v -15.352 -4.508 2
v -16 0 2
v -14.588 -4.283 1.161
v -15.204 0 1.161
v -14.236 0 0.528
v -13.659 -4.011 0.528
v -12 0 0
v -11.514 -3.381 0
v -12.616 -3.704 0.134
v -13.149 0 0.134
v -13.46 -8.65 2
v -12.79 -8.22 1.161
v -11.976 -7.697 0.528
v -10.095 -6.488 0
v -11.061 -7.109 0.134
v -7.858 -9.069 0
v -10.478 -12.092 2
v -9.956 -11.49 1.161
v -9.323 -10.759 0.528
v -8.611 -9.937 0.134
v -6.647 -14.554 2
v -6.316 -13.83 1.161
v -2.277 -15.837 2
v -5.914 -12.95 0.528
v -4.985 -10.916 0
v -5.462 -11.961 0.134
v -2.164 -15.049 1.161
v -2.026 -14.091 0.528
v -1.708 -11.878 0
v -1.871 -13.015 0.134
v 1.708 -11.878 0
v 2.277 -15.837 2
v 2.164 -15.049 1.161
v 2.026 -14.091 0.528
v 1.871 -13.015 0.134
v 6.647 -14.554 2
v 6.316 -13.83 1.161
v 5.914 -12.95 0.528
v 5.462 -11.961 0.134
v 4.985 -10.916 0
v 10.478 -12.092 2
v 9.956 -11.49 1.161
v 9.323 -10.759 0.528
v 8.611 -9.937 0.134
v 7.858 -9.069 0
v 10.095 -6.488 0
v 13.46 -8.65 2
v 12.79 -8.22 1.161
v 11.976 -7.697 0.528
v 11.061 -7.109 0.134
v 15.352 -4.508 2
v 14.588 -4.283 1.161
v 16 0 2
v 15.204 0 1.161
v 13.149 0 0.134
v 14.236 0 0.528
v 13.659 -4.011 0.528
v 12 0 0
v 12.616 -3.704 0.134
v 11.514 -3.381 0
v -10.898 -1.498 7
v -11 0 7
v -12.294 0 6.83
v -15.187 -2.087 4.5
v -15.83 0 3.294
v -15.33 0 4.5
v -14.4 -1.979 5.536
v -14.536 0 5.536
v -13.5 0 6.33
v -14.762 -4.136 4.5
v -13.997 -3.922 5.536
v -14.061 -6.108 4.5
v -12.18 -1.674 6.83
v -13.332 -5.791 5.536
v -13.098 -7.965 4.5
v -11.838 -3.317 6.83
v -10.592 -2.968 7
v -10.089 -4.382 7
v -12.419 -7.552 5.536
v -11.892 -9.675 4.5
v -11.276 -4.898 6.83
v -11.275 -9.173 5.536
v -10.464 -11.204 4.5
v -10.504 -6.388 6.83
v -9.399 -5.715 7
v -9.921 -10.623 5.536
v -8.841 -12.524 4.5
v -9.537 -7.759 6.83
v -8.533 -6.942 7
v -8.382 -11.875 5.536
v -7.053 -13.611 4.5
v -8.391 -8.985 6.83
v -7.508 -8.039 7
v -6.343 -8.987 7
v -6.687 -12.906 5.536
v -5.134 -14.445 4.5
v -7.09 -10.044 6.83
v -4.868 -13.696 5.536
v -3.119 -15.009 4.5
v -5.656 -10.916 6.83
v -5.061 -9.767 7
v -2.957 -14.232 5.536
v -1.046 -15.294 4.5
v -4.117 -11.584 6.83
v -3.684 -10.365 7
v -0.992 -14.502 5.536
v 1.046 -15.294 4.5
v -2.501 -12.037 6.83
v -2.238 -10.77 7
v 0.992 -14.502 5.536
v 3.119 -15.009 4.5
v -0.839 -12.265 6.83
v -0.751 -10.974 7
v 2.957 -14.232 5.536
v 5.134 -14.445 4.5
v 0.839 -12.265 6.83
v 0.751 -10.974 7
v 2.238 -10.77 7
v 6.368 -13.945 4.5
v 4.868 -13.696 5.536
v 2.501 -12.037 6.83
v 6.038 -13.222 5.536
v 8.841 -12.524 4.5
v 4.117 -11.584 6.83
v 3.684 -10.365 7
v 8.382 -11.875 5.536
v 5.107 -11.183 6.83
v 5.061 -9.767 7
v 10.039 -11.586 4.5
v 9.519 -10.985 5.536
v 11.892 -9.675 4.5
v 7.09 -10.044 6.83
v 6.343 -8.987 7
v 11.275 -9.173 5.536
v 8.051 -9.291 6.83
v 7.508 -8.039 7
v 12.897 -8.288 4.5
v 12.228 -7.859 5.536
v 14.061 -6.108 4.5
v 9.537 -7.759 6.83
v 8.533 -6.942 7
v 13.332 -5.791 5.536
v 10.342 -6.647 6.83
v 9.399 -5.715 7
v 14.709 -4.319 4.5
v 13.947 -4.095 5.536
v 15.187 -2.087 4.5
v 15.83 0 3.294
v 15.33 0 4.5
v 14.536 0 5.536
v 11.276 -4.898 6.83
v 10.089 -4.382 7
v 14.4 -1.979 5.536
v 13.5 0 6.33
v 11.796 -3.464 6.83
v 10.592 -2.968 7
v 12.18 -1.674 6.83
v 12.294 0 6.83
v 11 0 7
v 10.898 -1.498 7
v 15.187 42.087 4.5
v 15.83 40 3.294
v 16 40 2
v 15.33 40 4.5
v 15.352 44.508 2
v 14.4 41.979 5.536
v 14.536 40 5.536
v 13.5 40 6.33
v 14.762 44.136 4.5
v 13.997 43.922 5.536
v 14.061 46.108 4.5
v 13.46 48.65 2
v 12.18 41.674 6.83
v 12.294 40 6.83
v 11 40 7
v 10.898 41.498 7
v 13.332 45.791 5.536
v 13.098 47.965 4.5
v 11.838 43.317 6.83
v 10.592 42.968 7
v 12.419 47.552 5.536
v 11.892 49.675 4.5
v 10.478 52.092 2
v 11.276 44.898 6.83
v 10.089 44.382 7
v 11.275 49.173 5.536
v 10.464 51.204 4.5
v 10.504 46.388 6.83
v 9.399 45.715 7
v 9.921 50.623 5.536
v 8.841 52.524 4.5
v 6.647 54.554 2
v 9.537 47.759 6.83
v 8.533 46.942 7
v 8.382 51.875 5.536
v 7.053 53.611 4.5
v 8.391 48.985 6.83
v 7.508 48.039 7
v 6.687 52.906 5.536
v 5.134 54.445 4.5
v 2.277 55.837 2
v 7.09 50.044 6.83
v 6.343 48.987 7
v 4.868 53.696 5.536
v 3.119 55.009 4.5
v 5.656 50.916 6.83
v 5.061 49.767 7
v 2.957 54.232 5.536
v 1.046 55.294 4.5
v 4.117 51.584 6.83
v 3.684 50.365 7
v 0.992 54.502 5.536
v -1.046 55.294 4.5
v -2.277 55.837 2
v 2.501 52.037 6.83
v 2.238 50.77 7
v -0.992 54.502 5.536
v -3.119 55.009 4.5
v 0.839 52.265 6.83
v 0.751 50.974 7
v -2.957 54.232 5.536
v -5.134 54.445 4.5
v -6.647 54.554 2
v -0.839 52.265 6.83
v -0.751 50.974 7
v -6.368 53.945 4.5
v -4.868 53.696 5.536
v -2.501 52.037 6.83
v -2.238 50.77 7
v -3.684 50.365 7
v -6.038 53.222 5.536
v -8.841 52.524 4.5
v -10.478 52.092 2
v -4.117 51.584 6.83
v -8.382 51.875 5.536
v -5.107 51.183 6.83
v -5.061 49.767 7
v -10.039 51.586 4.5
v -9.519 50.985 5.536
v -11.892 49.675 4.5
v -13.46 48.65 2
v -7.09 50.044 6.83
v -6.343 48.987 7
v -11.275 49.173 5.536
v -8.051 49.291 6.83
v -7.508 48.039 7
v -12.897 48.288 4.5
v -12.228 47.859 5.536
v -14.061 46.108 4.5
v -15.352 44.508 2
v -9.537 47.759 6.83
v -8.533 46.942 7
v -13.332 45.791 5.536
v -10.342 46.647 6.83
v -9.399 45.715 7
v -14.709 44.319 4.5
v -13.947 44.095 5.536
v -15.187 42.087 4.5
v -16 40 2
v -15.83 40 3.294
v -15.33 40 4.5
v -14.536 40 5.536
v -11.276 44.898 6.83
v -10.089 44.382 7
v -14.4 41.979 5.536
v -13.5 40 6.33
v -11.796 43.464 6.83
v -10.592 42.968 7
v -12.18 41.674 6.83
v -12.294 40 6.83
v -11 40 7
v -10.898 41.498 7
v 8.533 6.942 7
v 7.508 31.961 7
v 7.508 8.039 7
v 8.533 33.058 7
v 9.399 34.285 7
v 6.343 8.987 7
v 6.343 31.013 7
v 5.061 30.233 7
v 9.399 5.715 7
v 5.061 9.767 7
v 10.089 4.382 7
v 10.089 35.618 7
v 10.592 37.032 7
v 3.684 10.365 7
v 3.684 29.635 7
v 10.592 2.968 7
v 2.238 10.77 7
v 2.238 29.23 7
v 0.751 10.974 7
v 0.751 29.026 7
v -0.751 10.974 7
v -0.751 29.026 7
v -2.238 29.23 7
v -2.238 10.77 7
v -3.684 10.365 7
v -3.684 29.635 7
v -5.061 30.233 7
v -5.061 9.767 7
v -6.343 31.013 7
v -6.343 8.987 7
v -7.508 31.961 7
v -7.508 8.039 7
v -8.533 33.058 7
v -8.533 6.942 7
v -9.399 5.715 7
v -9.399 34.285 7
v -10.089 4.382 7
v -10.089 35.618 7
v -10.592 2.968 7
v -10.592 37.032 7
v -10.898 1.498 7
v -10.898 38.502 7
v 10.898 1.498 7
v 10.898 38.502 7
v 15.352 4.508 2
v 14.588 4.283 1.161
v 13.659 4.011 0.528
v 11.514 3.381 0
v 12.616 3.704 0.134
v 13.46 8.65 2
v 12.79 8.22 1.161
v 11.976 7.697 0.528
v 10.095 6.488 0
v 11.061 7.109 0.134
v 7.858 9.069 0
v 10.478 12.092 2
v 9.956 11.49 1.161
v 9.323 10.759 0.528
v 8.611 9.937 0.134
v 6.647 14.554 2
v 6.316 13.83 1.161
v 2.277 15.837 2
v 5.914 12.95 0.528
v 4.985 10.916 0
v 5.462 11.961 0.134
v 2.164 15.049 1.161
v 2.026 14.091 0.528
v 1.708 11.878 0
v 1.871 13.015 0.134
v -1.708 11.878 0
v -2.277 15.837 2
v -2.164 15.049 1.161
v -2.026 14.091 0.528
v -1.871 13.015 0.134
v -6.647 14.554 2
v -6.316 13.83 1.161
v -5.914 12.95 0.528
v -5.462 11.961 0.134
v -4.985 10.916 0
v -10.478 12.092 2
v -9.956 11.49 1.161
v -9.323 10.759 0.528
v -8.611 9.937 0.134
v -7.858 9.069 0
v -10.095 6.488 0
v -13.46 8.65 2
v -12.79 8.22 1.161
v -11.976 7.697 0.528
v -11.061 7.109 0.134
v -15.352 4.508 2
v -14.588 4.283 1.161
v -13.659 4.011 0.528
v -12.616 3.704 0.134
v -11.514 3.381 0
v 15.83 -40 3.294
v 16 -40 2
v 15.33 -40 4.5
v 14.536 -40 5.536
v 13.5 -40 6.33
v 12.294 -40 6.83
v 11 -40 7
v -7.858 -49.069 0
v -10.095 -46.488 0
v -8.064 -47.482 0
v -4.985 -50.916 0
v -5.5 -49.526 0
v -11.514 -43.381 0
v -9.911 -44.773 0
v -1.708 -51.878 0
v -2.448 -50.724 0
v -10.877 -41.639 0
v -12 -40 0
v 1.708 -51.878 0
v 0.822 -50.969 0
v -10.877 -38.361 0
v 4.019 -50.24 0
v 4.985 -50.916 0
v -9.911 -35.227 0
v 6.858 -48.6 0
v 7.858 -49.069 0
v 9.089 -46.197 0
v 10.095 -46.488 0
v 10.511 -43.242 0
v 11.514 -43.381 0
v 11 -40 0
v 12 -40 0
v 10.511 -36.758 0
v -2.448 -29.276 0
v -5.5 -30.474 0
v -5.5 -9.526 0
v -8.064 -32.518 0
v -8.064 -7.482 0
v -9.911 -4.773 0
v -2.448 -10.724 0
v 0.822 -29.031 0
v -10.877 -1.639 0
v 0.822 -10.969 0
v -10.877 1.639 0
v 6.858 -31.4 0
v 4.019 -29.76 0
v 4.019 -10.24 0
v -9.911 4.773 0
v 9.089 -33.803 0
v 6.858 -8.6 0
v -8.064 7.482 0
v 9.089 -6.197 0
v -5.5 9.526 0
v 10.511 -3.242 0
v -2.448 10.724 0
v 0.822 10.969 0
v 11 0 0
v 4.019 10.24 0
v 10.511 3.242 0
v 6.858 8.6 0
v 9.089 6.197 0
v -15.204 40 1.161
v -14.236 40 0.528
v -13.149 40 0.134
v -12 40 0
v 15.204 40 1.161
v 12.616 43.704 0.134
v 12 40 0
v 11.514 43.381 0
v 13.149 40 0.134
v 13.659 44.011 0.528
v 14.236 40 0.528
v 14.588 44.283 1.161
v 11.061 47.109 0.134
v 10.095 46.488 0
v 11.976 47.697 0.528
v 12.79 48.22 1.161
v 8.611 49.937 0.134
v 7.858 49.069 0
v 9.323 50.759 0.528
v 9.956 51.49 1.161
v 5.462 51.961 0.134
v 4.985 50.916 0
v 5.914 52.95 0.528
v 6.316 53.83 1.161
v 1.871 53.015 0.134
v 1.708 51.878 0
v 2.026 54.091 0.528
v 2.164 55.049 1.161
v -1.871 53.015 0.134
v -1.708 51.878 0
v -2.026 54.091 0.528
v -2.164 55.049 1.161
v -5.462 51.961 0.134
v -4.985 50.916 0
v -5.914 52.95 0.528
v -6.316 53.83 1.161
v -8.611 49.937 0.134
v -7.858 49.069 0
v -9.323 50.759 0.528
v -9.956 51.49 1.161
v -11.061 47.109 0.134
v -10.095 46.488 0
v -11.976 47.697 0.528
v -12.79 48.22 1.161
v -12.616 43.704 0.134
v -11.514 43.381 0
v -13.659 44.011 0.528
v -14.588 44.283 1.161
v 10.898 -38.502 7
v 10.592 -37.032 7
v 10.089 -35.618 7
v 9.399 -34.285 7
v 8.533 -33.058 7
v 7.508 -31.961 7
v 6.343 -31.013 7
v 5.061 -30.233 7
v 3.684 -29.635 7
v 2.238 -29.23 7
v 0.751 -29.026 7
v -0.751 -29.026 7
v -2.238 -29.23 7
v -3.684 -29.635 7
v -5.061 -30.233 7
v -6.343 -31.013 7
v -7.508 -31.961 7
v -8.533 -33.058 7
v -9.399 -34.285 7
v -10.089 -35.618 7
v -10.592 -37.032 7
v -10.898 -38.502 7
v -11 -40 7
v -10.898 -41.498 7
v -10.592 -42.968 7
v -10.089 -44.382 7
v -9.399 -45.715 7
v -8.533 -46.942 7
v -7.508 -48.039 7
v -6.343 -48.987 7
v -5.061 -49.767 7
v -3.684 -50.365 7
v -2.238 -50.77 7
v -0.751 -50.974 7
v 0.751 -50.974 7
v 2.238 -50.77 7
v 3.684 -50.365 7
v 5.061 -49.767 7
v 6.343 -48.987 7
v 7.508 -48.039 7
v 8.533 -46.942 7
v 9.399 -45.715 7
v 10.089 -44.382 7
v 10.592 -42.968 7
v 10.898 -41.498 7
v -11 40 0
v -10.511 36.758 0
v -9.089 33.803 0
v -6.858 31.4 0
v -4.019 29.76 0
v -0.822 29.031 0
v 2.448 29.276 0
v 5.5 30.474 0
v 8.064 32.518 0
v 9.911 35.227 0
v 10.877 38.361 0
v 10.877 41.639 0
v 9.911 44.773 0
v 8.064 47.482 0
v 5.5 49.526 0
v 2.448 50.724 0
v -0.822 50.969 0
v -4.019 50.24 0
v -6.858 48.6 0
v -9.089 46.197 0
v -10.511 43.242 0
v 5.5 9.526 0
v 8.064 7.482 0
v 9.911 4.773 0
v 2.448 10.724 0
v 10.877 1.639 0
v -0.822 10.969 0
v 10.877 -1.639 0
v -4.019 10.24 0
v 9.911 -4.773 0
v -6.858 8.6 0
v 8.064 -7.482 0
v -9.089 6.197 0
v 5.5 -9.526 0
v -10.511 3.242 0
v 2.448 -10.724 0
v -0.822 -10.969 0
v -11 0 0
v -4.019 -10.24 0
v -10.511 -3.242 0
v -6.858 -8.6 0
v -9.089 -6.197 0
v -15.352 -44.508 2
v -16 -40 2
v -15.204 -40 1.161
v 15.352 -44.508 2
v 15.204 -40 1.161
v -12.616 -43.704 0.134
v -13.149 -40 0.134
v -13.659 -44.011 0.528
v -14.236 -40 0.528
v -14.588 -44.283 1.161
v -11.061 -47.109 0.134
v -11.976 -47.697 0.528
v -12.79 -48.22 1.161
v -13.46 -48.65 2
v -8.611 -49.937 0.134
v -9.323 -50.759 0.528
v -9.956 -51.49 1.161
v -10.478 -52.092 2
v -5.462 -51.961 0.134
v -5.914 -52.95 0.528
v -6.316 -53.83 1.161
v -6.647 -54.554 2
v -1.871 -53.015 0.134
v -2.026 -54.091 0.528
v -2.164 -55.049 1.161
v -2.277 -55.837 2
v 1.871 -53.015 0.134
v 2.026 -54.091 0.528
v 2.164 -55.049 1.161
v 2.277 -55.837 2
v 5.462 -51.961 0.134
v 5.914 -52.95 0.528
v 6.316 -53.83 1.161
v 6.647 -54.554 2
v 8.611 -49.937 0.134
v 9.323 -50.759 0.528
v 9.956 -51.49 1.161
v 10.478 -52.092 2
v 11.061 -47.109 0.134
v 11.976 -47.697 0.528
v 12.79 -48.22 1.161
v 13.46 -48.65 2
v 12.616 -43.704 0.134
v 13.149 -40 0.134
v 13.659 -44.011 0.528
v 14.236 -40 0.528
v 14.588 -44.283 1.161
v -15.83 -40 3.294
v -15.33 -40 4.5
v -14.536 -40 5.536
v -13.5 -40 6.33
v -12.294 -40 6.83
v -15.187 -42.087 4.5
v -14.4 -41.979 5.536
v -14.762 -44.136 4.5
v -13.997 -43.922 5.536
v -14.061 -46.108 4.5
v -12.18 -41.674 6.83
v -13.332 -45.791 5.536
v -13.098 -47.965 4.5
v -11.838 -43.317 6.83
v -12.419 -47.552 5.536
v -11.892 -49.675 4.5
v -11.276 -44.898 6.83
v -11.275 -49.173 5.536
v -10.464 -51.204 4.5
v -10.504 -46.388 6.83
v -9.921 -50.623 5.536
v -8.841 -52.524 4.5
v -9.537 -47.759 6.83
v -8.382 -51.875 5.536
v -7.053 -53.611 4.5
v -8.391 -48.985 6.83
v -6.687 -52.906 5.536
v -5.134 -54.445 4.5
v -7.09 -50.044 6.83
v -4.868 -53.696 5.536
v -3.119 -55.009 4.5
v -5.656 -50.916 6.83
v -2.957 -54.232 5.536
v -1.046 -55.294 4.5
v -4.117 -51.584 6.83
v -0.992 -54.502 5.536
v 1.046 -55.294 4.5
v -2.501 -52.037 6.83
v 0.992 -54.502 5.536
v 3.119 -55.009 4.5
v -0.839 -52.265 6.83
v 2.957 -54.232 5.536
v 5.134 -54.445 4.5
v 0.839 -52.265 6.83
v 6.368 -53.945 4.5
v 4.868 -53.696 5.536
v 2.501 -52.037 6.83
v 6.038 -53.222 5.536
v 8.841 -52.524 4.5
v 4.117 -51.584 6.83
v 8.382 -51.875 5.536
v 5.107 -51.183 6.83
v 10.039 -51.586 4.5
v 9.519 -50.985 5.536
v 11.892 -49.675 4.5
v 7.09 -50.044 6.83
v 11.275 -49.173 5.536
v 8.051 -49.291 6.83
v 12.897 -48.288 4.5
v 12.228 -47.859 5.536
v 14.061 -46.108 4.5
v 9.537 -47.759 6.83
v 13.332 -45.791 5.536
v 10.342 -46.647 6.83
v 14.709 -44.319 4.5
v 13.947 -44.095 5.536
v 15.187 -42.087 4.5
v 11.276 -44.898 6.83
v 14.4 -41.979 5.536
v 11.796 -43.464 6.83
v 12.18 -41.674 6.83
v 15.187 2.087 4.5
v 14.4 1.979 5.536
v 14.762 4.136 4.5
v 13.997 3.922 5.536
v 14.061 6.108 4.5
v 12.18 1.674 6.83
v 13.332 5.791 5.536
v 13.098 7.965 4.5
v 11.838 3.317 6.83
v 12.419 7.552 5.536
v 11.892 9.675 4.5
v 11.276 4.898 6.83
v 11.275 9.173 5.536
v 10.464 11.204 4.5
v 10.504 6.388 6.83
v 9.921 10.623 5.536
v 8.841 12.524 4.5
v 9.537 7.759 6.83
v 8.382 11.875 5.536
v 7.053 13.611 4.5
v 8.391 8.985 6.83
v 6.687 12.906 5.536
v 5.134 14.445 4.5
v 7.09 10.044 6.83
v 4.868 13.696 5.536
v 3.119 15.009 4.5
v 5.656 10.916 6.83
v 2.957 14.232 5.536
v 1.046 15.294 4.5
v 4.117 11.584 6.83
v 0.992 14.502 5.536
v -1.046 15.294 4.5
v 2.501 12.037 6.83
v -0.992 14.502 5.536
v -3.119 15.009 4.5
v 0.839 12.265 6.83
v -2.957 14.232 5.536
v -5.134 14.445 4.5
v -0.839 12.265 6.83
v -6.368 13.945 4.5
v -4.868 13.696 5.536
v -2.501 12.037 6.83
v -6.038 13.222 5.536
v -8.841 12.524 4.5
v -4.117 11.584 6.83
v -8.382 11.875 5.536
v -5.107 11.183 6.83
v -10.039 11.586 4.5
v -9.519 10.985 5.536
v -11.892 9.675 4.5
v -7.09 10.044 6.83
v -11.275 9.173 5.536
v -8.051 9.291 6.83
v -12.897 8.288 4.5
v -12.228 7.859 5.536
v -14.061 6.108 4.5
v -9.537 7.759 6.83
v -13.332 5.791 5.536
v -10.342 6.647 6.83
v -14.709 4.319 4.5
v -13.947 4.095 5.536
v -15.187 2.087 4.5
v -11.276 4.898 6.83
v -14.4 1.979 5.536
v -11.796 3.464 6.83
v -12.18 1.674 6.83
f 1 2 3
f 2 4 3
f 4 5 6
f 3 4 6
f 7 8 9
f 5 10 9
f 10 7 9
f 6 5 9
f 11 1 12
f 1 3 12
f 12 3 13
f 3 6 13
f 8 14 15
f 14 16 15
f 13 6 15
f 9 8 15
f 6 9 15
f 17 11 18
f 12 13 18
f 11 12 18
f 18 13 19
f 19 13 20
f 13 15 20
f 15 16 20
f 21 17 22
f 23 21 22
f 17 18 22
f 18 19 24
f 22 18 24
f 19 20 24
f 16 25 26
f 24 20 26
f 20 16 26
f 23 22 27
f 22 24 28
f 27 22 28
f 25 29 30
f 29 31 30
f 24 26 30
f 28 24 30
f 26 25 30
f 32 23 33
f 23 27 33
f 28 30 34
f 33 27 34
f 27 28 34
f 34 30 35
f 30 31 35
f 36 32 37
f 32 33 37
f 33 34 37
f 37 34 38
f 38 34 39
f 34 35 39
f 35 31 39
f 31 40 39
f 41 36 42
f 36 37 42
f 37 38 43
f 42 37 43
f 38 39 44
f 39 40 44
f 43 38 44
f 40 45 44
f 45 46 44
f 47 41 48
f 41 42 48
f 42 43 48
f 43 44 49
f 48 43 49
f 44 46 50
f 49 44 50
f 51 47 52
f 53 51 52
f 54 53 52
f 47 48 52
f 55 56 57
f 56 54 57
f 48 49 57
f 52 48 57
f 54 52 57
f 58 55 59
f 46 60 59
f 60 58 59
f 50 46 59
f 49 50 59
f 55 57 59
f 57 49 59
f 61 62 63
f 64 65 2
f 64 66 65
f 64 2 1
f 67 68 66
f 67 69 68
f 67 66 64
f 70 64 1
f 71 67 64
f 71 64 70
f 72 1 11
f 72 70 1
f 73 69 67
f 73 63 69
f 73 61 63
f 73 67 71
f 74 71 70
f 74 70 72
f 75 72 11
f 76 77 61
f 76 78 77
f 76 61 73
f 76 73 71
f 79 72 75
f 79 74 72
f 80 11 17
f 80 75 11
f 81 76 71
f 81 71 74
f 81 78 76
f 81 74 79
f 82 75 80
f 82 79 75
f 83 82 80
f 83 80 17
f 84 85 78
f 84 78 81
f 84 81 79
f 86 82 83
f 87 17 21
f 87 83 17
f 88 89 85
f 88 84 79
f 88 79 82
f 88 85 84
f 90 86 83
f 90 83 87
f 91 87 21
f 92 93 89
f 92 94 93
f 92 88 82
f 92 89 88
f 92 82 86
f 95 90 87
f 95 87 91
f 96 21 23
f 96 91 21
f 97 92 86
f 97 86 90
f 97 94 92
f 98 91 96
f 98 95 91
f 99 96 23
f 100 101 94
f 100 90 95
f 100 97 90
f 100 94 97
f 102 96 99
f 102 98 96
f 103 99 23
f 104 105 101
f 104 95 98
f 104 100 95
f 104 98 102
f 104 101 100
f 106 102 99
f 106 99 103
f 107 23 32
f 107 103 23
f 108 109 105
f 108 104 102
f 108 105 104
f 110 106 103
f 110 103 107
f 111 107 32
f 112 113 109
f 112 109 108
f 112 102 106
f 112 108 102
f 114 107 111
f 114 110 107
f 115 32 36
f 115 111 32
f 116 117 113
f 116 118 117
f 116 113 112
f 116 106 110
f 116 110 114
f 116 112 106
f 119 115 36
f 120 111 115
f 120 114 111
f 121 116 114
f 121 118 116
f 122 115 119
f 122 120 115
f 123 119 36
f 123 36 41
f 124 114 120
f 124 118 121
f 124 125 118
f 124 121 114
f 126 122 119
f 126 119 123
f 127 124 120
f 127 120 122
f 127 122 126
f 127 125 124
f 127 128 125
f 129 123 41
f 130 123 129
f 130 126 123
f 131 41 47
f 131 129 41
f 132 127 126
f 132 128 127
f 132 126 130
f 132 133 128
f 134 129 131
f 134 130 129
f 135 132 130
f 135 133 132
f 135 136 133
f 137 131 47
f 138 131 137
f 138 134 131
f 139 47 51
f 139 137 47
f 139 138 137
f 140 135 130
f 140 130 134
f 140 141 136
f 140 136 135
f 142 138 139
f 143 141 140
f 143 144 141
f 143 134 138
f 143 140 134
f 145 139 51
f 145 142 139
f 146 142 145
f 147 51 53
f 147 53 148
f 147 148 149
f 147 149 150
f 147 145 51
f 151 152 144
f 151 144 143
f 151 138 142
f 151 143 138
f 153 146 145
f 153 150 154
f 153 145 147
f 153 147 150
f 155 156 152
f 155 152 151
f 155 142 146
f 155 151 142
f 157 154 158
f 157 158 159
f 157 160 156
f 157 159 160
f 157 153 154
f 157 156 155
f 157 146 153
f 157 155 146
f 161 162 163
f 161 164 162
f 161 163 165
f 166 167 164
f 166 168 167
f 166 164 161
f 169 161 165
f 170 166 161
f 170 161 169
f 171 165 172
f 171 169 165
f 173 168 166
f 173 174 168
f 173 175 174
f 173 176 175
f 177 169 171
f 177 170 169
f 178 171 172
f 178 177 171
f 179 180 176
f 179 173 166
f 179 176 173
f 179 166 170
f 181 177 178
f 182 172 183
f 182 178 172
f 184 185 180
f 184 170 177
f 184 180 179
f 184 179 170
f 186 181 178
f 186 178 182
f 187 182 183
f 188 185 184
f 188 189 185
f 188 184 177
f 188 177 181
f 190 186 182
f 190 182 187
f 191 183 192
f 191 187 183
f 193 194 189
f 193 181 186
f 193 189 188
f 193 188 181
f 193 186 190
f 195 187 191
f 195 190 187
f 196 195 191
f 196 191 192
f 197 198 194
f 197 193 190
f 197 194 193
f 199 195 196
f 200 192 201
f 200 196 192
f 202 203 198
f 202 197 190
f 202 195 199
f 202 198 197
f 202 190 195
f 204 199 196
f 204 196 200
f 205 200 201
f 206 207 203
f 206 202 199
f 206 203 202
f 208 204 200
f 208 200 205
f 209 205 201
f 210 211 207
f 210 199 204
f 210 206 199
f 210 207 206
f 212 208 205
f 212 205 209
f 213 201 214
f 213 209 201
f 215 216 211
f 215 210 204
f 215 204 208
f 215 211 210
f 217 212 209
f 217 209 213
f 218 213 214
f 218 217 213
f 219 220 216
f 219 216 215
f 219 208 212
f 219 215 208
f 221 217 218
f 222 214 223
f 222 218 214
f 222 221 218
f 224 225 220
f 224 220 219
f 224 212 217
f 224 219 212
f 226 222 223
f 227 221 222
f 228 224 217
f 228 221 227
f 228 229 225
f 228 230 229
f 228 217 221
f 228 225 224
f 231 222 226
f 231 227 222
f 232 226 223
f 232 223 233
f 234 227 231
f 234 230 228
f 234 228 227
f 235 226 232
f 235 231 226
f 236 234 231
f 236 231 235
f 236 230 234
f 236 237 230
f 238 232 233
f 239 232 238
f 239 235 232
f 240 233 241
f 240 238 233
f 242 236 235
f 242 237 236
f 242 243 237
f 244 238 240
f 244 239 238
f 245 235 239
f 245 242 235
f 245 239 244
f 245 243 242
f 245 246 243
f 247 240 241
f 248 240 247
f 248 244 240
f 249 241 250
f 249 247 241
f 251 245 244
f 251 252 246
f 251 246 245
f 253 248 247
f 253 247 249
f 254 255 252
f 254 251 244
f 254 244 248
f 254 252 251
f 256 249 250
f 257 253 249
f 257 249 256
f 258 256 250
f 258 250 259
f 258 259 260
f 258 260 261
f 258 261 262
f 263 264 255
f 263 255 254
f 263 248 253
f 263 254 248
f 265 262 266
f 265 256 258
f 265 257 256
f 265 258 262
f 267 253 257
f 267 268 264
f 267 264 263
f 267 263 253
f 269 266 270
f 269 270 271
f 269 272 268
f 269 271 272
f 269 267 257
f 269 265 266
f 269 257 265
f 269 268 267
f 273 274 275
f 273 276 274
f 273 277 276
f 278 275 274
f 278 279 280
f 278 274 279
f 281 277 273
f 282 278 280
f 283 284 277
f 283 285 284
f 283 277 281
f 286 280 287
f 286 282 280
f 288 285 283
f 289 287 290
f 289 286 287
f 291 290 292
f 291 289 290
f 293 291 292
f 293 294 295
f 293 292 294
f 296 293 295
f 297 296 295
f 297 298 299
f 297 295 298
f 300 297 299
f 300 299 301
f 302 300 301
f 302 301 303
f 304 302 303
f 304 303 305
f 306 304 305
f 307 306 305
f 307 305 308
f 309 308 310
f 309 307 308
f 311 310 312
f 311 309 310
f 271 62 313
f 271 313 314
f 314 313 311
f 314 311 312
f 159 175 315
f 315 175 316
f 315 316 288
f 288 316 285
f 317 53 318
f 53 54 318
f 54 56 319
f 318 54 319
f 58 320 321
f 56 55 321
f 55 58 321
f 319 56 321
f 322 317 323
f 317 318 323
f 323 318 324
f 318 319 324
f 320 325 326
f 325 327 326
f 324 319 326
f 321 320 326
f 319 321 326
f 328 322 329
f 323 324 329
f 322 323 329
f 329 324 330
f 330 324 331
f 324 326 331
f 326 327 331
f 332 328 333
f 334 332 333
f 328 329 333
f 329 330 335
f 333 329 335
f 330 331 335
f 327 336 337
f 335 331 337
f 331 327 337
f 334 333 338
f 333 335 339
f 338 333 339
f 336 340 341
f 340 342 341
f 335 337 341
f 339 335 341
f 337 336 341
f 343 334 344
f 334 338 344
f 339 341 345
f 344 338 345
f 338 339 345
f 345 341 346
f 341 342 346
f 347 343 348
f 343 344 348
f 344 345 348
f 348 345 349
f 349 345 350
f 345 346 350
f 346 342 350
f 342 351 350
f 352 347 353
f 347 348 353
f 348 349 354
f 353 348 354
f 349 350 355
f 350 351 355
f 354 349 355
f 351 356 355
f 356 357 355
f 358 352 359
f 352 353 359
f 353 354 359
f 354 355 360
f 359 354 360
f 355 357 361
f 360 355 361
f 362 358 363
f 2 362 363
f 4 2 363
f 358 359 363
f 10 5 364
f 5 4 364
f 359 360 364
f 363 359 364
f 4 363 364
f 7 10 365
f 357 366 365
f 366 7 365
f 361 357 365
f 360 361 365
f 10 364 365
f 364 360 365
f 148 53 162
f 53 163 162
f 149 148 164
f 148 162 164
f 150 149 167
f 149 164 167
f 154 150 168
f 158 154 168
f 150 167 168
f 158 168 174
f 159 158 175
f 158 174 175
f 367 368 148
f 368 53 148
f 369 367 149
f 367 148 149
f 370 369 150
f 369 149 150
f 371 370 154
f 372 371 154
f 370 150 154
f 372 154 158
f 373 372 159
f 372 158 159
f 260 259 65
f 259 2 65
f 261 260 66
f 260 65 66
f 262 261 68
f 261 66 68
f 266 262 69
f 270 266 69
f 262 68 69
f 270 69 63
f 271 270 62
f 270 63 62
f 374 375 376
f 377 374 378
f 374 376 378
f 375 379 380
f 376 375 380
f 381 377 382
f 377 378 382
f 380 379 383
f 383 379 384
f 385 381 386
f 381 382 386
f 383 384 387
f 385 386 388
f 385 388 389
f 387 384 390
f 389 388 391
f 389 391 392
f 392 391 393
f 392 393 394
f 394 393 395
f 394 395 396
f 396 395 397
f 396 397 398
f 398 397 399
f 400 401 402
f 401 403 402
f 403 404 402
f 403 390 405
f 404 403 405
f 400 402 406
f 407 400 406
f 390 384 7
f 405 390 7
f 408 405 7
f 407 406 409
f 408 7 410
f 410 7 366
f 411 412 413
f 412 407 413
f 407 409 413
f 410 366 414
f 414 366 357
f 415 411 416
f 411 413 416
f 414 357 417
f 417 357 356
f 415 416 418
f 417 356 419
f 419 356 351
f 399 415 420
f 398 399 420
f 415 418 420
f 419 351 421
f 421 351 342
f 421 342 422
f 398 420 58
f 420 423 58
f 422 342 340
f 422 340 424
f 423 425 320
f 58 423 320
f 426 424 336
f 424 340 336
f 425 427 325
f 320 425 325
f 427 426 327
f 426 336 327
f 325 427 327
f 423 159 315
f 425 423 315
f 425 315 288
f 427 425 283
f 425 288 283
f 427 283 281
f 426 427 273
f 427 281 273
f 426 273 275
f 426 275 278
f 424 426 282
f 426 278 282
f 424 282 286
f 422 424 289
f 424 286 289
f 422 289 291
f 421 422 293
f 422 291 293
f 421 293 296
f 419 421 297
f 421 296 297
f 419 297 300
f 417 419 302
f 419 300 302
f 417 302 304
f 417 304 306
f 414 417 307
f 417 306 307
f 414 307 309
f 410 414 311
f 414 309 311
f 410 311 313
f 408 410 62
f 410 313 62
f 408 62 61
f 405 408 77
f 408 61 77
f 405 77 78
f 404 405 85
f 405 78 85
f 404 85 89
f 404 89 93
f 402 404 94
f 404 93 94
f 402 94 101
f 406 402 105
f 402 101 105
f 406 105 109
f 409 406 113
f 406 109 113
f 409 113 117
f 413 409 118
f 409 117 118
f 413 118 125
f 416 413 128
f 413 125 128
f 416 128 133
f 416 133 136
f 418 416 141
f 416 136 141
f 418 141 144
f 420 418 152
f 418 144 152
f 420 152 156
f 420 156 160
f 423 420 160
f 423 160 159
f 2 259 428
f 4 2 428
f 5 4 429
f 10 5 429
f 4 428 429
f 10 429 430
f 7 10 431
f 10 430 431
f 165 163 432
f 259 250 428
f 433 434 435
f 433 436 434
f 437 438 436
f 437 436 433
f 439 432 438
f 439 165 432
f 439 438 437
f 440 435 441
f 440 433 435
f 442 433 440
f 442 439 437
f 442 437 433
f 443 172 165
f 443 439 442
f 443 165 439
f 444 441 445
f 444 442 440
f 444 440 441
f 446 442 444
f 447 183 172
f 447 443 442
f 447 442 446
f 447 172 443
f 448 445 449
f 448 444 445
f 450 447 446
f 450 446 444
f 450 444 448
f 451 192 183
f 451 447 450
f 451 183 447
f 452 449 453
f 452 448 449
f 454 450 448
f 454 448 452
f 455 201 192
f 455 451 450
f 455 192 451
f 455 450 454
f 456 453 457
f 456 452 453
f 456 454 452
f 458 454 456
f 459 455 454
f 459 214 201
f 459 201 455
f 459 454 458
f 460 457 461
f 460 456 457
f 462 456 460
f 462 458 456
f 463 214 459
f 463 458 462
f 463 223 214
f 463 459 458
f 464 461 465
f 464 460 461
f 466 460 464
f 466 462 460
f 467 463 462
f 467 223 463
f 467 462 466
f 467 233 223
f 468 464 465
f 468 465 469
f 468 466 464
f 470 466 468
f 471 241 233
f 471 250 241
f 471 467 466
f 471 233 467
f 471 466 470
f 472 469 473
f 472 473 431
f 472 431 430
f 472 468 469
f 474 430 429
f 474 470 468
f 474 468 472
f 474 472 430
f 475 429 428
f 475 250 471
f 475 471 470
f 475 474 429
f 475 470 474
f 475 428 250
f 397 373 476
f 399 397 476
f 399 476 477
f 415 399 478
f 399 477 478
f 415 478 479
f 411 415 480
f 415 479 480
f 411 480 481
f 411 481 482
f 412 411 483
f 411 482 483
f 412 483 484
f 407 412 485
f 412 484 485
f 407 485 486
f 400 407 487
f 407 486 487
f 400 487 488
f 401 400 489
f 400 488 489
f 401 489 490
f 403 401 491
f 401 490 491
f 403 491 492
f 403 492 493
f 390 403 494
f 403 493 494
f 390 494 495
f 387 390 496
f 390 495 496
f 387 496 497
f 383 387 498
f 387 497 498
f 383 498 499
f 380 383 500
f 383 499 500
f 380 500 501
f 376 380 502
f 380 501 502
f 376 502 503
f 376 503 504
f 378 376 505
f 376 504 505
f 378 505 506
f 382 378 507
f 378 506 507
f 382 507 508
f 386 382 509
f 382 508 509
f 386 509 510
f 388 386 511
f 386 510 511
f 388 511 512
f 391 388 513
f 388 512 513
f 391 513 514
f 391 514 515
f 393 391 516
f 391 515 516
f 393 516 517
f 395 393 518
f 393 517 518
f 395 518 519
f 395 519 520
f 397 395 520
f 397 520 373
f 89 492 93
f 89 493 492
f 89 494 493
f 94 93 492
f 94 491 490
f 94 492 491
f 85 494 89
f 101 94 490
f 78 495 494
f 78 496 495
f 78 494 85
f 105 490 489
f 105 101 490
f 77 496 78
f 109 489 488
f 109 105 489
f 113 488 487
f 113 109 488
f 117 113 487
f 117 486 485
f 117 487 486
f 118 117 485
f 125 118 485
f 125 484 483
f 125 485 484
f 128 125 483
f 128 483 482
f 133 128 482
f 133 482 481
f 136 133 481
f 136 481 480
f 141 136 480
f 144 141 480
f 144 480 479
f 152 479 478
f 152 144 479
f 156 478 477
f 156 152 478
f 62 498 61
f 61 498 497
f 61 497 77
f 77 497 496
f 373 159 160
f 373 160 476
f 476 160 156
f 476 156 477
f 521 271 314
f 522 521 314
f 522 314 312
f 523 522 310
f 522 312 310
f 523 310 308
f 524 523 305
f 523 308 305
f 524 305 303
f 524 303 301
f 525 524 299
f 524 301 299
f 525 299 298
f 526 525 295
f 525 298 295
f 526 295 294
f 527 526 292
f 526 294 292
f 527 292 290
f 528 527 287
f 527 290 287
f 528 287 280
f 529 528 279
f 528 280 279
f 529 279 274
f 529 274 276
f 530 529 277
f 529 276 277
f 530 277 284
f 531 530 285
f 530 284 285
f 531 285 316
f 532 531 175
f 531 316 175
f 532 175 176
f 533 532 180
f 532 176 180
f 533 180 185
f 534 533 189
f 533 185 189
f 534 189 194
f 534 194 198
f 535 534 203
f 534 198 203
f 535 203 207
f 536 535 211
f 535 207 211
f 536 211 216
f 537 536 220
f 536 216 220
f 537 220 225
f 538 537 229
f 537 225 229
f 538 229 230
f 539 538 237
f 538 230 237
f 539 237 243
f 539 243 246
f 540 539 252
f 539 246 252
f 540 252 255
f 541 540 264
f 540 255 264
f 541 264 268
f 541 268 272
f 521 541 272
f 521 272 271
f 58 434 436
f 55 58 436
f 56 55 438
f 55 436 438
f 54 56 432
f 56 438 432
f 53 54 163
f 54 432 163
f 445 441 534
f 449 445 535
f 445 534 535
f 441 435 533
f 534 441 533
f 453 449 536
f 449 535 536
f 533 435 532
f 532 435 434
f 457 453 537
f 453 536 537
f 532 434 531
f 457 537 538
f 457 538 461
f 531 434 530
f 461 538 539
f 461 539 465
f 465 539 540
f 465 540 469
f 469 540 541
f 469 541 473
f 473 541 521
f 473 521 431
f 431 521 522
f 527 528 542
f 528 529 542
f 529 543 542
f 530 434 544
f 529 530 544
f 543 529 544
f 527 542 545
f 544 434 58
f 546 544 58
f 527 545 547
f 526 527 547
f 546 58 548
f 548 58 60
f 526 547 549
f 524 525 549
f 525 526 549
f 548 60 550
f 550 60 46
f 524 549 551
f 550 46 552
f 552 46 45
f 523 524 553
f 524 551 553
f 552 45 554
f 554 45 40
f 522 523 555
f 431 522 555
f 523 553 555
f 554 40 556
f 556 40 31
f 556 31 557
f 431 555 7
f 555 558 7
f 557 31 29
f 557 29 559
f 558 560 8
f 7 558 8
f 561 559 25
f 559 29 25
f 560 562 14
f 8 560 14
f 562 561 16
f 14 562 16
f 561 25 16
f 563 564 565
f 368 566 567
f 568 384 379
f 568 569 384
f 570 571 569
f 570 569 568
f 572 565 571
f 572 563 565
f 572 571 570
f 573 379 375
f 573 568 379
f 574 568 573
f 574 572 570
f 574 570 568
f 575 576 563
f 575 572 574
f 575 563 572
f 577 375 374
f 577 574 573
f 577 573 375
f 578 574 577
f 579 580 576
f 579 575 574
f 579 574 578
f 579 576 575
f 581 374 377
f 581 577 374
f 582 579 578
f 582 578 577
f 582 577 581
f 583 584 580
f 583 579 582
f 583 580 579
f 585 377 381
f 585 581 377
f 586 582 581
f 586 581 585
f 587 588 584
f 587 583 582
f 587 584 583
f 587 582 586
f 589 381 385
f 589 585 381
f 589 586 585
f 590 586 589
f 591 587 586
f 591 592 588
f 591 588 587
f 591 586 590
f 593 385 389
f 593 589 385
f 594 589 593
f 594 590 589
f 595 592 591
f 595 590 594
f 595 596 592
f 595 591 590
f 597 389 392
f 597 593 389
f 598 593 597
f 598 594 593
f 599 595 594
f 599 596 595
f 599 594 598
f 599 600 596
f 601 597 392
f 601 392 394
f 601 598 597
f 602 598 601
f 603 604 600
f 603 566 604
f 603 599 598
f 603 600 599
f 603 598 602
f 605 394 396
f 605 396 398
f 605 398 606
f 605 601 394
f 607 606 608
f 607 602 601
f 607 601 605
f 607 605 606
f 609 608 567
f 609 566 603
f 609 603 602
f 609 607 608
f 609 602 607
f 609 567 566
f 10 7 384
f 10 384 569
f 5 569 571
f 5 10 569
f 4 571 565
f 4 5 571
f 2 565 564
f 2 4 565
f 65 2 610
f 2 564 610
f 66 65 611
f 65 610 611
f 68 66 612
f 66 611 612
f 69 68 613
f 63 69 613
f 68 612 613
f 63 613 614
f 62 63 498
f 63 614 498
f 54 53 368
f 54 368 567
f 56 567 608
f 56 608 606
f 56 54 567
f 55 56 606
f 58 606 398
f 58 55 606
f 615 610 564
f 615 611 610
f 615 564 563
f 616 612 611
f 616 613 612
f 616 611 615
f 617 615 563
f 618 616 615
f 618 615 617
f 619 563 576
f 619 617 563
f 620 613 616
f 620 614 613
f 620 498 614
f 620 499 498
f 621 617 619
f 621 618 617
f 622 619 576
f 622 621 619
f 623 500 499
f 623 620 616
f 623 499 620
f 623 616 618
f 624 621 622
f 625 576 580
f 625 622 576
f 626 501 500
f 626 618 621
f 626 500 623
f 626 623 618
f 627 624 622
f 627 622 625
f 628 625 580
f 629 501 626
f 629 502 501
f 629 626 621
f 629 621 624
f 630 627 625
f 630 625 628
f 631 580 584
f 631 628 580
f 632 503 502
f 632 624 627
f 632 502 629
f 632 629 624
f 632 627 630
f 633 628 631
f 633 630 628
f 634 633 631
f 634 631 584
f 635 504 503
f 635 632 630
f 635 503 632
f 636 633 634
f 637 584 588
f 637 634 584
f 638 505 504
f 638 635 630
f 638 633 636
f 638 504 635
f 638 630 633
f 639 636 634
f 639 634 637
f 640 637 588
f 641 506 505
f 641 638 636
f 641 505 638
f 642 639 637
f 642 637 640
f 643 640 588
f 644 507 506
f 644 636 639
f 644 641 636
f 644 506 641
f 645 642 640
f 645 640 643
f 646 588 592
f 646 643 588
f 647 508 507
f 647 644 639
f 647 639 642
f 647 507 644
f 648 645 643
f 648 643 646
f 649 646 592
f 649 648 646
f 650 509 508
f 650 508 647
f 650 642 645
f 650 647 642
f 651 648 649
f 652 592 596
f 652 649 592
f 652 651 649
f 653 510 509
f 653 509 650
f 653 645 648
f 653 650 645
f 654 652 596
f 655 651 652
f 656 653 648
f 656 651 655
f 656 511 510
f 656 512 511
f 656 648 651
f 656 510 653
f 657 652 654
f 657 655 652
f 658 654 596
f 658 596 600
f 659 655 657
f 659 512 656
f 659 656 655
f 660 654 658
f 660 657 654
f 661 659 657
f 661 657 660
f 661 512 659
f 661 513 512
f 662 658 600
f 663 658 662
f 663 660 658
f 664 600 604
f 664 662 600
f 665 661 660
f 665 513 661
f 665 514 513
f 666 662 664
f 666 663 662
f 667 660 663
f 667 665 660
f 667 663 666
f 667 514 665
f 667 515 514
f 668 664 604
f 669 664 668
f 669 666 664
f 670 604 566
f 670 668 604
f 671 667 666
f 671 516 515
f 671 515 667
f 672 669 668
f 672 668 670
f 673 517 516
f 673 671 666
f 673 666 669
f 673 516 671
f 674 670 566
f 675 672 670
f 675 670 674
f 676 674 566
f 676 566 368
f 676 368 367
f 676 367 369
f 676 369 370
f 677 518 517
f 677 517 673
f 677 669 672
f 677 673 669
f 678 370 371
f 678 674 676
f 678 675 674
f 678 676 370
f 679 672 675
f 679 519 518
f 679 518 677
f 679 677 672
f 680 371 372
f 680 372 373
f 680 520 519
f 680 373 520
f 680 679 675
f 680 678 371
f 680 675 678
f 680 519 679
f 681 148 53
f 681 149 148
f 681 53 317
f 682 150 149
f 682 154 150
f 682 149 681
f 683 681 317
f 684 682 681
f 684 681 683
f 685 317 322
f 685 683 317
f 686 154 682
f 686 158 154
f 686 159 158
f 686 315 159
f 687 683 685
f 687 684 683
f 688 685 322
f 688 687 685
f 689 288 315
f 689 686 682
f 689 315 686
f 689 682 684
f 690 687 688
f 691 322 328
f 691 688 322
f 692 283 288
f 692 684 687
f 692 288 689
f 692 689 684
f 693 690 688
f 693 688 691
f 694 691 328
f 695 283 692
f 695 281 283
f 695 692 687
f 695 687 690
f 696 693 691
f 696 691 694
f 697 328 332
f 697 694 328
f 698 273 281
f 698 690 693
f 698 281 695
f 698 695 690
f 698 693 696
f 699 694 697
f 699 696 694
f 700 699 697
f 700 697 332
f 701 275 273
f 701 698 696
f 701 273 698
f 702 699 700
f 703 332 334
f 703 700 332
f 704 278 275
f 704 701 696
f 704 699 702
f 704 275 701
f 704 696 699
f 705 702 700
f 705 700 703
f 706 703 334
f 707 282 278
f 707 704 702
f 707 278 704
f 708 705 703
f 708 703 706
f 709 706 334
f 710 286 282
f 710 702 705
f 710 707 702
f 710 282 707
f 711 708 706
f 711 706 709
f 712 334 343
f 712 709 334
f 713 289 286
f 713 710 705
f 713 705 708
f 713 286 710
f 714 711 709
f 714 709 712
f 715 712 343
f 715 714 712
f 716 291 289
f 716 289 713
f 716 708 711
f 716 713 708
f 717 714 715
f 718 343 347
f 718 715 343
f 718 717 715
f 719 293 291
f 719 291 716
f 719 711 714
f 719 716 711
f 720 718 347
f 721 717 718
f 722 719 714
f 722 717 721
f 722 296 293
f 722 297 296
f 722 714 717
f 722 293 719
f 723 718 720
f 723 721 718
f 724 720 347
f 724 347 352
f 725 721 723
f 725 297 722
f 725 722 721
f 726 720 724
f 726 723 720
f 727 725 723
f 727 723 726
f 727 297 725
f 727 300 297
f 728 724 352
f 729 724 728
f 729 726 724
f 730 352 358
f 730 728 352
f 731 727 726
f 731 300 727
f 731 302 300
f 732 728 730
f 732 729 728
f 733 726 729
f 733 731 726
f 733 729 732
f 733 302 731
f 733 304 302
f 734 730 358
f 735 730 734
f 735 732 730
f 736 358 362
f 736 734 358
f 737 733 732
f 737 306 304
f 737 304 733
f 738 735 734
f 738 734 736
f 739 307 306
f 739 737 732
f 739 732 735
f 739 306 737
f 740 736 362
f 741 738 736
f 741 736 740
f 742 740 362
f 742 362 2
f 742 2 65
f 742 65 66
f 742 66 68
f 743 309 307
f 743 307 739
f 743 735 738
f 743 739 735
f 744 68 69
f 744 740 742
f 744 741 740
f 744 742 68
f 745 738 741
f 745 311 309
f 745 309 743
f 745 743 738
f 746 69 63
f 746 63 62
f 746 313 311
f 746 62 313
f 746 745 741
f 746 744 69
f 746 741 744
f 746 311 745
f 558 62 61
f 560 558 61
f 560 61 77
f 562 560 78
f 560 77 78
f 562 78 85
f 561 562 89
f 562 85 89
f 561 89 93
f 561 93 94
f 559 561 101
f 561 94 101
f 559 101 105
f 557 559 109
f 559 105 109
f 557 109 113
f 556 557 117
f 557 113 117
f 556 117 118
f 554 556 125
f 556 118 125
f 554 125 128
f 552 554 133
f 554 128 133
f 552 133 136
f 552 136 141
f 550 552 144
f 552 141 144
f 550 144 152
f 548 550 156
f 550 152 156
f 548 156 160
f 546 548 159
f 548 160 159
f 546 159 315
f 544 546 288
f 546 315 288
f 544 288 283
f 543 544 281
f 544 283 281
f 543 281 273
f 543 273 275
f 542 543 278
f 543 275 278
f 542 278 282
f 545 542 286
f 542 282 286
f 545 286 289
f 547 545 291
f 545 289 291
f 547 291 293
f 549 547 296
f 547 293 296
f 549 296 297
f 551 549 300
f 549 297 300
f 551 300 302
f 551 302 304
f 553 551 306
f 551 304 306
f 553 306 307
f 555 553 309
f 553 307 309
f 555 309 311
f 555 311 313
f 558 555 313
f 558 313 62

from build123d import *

# Parameters (mm, degrees)
F1_DEPTH      = 7
F2_R          = 11
F3_DEPTH      = 7
F5_COUNT      = 2
F6_R          = 4.99999
F6_2_R        = 4.99999
F7_T1_DEPTH   = 40
F7_T4_ANGLE   = 180
F7_T6_ANGLE   = 180
F7_2_T1_DEPTH = 40
F7_2_T4_ANGLE = 180
F7_2_T6_ANGLE = 180


# Not quite as in the source:
# - a fillet or chamfer that OpenCascade refuses, or shapes differently, is made with other operations: its cross-section is extruded or revolved along the edge and cut away or added
# - a fillet or chamfer is up to 0.001 mm smaller than in the source, because OpenCascade refuses the exact size


with BuildPart() as f1:
    # F0 (on Top) → F1 (new body)
    with BuildSketch(Plane.XY):
        with BuildLine():
            ThreePointArc((-16, 0), (0, -16), (16, 0))
            ThreePointArc((16, 0), (0, 16), (-16, 0))
        make_face()
        with BuildLine():
            Line((16, -40), (16, 0))
            ThreePointArc((16, 0), (0, -16), (-16, 0))
            Line((-16, 0), (-16, -40))
            ThreePointArc((-16, -40), (0, -24), (16, -40))
        make_face()
        with BuildLine():
            ThreePointArc((-16, -40), (0, -56), (16, -40))
            ThreePointArc((16, -40), (0, -24), (-16, -40))
        make_face()
    extrude(amount=F1_DEPTH)

    # F2 (on face) → F3 (cut, through all)
    with BuildSketch(Plane.XY.offset(7)):
        Circle(F2_R)
        with Locations((0, -40)):
            Circle(F2_R)
    extrude(amount=-F3_DEPTH, mode=Mode.SUBTRACT)


with BuildPart() as f5_1:
    # F5: instance of F1
    add(f1.part.rotate(Axis((0, 0, -3.6183325574), (0, 0, -1)), 1 * 360 / F5_COUNT))

    # F6#2 (radius 5 in the source; OpenCascade refuses exactly that, so slightly less here)
    f6_2_edges = [f5_1.edges().sort_by_distance(p)[0] for p in [
        (-16, 20, 7),
    ]]
    fillet(f6_2_edges, radius=F6_2_R)

    # F7#2: fillet of radius 5 on 1 edges, made by hand

    # F7_2_s2 → F7_2_t1 (cut)
    with BuildSketch(Plane.XZ.offset(-40)):
        with BuildLine():
            ThreePointArc((-16, 2.00001), (-14.2360660677, 0.5278668401), (-11.9999925, 0))
            Line((-11.9999925, 0), (-16, 0))
            Line((-16, 0), (-16, 2.00001))
        make_face()
        with BuildLine():
            ThreePointArc((11.9999925, 0), (14.2360660677, 0.5278668401), (16, 2.00001))
            Line((16, 2.00001), (16, 0))
            Line((16, 0), (11.9999925, 0))
        make_face()
    extrude(amount=F7_2_T1_DEPTH, mode=Mode.SUBTRACT)

    # F7_2_s3 → F7_2_t4 (revolve, cut)
    with BuildSketch(Plane.XZ.offset(-40)):
        with BuildLine():
            ThreePointArc((11.9999925, 0), (14.2360660677, 0.5278668401), (16, 2.00001))
            Line((16, 2.00001), (16, 0))
            Line((16, 0), (11.9999925, 0))
        make_face()
    revolve(axis=Axis((0, 40, 0), (0, 0, 1)), revolution_arc=F7_2_T4_ANGLE, mode=Mode.SUBTRACT)

    # F7_2_s5 → F7_2_t6 (revolve, cut)
    with BuildSketch(Plane.XZ):
        with BuildLine():
            ThreePointArc((-16, 2.00001), (-14.2360660677, 0.5278668401), (-11.9999925, 0))
            Line((-11.9999925, 0), (-16, 0))
            Line((-16, 0), (-16, 2.00001))
        make_face()
    revolve(axis=Axis((0, 0, 0), (0, 0, 1)), revolution_arc=F7_2_T6_ANGLE, mode=Mode.SUBTRACT)


with BuildPart() as f1_1:
    add(f1.part)

    # F6 (radius 5 in the source; OpenCascade refuses exactly that, so slightly less here)
    f6_edges = [f1_1.edges().sort_by_distance(p)[0] for p in [
        (-16, -20, 7),
    ]]
    fillet(f6_edges, radius=F6_R)

    # F7: fillet of radius 5 on 1 edges, made by hand

    # F7_s2 → F7_t1 (cut)
    with BuildSketch(Plane.XZ):
        with BuildLine():
            ThreePointArc((-11.9999925, 0), (-14.2360660677, 0.5278668401), (-16, 2.00001))
            Line((-16, 2.00001), (-16, 0))
            Line((-16, 0), (-11.9999925, 0))
        make_face()
        with BuildLine():
            ThreePointArc((16, 2.00001), (14.2360660677, 0.5278668401), (11.9999925, 0))
            Line((11.9999925, 0), (16, 0))
            Line((16, 0), (16, 2.00001))
        make_face()
    extrude(amount=F7_T1_DEPTH, mode=Mode.SUBTRACT)

    # F7_s3 → F7_t4 (revolve, cut)
    with BuildSketch(Plane.XZ):
        with BuildLine():
            ThreePointArc((16, 2.00001), (14.2360660677, 0.5278668401), (11.9999925, 0))
            Line((11.9999925, 0), (16, 0))
            Line((16, 0), (16, 2.00001))
        make_face()
    revolve(axis=Axis((0, 0, 0), (0, 0, 1)), revolution_arc=F7_T4_ANGLE, mode=Mode.SUBTRACT)

    # F7_s5 → F7_t6 (revolve, cut)
    with BuildSketch(Plane.XZ.offset(40)):
        with BuildLine():
            ThreePointArc((-11.9999925, 0), (-14.2360660677, 0.5278668401), (-16, 2.00001))
            Line((-16, 2.00001), (-16, 0))
            Line((-16, 0), (-11.9999925, 0))
        make_face()
    revolve(axis=Axis((0, -40, 0), (0, 0, 1)), revolution_arc=F7_T6_ANGLE, mode=Mode.SUBTRACT)


solid = Compound([f5_1.part, f1_1.part])
